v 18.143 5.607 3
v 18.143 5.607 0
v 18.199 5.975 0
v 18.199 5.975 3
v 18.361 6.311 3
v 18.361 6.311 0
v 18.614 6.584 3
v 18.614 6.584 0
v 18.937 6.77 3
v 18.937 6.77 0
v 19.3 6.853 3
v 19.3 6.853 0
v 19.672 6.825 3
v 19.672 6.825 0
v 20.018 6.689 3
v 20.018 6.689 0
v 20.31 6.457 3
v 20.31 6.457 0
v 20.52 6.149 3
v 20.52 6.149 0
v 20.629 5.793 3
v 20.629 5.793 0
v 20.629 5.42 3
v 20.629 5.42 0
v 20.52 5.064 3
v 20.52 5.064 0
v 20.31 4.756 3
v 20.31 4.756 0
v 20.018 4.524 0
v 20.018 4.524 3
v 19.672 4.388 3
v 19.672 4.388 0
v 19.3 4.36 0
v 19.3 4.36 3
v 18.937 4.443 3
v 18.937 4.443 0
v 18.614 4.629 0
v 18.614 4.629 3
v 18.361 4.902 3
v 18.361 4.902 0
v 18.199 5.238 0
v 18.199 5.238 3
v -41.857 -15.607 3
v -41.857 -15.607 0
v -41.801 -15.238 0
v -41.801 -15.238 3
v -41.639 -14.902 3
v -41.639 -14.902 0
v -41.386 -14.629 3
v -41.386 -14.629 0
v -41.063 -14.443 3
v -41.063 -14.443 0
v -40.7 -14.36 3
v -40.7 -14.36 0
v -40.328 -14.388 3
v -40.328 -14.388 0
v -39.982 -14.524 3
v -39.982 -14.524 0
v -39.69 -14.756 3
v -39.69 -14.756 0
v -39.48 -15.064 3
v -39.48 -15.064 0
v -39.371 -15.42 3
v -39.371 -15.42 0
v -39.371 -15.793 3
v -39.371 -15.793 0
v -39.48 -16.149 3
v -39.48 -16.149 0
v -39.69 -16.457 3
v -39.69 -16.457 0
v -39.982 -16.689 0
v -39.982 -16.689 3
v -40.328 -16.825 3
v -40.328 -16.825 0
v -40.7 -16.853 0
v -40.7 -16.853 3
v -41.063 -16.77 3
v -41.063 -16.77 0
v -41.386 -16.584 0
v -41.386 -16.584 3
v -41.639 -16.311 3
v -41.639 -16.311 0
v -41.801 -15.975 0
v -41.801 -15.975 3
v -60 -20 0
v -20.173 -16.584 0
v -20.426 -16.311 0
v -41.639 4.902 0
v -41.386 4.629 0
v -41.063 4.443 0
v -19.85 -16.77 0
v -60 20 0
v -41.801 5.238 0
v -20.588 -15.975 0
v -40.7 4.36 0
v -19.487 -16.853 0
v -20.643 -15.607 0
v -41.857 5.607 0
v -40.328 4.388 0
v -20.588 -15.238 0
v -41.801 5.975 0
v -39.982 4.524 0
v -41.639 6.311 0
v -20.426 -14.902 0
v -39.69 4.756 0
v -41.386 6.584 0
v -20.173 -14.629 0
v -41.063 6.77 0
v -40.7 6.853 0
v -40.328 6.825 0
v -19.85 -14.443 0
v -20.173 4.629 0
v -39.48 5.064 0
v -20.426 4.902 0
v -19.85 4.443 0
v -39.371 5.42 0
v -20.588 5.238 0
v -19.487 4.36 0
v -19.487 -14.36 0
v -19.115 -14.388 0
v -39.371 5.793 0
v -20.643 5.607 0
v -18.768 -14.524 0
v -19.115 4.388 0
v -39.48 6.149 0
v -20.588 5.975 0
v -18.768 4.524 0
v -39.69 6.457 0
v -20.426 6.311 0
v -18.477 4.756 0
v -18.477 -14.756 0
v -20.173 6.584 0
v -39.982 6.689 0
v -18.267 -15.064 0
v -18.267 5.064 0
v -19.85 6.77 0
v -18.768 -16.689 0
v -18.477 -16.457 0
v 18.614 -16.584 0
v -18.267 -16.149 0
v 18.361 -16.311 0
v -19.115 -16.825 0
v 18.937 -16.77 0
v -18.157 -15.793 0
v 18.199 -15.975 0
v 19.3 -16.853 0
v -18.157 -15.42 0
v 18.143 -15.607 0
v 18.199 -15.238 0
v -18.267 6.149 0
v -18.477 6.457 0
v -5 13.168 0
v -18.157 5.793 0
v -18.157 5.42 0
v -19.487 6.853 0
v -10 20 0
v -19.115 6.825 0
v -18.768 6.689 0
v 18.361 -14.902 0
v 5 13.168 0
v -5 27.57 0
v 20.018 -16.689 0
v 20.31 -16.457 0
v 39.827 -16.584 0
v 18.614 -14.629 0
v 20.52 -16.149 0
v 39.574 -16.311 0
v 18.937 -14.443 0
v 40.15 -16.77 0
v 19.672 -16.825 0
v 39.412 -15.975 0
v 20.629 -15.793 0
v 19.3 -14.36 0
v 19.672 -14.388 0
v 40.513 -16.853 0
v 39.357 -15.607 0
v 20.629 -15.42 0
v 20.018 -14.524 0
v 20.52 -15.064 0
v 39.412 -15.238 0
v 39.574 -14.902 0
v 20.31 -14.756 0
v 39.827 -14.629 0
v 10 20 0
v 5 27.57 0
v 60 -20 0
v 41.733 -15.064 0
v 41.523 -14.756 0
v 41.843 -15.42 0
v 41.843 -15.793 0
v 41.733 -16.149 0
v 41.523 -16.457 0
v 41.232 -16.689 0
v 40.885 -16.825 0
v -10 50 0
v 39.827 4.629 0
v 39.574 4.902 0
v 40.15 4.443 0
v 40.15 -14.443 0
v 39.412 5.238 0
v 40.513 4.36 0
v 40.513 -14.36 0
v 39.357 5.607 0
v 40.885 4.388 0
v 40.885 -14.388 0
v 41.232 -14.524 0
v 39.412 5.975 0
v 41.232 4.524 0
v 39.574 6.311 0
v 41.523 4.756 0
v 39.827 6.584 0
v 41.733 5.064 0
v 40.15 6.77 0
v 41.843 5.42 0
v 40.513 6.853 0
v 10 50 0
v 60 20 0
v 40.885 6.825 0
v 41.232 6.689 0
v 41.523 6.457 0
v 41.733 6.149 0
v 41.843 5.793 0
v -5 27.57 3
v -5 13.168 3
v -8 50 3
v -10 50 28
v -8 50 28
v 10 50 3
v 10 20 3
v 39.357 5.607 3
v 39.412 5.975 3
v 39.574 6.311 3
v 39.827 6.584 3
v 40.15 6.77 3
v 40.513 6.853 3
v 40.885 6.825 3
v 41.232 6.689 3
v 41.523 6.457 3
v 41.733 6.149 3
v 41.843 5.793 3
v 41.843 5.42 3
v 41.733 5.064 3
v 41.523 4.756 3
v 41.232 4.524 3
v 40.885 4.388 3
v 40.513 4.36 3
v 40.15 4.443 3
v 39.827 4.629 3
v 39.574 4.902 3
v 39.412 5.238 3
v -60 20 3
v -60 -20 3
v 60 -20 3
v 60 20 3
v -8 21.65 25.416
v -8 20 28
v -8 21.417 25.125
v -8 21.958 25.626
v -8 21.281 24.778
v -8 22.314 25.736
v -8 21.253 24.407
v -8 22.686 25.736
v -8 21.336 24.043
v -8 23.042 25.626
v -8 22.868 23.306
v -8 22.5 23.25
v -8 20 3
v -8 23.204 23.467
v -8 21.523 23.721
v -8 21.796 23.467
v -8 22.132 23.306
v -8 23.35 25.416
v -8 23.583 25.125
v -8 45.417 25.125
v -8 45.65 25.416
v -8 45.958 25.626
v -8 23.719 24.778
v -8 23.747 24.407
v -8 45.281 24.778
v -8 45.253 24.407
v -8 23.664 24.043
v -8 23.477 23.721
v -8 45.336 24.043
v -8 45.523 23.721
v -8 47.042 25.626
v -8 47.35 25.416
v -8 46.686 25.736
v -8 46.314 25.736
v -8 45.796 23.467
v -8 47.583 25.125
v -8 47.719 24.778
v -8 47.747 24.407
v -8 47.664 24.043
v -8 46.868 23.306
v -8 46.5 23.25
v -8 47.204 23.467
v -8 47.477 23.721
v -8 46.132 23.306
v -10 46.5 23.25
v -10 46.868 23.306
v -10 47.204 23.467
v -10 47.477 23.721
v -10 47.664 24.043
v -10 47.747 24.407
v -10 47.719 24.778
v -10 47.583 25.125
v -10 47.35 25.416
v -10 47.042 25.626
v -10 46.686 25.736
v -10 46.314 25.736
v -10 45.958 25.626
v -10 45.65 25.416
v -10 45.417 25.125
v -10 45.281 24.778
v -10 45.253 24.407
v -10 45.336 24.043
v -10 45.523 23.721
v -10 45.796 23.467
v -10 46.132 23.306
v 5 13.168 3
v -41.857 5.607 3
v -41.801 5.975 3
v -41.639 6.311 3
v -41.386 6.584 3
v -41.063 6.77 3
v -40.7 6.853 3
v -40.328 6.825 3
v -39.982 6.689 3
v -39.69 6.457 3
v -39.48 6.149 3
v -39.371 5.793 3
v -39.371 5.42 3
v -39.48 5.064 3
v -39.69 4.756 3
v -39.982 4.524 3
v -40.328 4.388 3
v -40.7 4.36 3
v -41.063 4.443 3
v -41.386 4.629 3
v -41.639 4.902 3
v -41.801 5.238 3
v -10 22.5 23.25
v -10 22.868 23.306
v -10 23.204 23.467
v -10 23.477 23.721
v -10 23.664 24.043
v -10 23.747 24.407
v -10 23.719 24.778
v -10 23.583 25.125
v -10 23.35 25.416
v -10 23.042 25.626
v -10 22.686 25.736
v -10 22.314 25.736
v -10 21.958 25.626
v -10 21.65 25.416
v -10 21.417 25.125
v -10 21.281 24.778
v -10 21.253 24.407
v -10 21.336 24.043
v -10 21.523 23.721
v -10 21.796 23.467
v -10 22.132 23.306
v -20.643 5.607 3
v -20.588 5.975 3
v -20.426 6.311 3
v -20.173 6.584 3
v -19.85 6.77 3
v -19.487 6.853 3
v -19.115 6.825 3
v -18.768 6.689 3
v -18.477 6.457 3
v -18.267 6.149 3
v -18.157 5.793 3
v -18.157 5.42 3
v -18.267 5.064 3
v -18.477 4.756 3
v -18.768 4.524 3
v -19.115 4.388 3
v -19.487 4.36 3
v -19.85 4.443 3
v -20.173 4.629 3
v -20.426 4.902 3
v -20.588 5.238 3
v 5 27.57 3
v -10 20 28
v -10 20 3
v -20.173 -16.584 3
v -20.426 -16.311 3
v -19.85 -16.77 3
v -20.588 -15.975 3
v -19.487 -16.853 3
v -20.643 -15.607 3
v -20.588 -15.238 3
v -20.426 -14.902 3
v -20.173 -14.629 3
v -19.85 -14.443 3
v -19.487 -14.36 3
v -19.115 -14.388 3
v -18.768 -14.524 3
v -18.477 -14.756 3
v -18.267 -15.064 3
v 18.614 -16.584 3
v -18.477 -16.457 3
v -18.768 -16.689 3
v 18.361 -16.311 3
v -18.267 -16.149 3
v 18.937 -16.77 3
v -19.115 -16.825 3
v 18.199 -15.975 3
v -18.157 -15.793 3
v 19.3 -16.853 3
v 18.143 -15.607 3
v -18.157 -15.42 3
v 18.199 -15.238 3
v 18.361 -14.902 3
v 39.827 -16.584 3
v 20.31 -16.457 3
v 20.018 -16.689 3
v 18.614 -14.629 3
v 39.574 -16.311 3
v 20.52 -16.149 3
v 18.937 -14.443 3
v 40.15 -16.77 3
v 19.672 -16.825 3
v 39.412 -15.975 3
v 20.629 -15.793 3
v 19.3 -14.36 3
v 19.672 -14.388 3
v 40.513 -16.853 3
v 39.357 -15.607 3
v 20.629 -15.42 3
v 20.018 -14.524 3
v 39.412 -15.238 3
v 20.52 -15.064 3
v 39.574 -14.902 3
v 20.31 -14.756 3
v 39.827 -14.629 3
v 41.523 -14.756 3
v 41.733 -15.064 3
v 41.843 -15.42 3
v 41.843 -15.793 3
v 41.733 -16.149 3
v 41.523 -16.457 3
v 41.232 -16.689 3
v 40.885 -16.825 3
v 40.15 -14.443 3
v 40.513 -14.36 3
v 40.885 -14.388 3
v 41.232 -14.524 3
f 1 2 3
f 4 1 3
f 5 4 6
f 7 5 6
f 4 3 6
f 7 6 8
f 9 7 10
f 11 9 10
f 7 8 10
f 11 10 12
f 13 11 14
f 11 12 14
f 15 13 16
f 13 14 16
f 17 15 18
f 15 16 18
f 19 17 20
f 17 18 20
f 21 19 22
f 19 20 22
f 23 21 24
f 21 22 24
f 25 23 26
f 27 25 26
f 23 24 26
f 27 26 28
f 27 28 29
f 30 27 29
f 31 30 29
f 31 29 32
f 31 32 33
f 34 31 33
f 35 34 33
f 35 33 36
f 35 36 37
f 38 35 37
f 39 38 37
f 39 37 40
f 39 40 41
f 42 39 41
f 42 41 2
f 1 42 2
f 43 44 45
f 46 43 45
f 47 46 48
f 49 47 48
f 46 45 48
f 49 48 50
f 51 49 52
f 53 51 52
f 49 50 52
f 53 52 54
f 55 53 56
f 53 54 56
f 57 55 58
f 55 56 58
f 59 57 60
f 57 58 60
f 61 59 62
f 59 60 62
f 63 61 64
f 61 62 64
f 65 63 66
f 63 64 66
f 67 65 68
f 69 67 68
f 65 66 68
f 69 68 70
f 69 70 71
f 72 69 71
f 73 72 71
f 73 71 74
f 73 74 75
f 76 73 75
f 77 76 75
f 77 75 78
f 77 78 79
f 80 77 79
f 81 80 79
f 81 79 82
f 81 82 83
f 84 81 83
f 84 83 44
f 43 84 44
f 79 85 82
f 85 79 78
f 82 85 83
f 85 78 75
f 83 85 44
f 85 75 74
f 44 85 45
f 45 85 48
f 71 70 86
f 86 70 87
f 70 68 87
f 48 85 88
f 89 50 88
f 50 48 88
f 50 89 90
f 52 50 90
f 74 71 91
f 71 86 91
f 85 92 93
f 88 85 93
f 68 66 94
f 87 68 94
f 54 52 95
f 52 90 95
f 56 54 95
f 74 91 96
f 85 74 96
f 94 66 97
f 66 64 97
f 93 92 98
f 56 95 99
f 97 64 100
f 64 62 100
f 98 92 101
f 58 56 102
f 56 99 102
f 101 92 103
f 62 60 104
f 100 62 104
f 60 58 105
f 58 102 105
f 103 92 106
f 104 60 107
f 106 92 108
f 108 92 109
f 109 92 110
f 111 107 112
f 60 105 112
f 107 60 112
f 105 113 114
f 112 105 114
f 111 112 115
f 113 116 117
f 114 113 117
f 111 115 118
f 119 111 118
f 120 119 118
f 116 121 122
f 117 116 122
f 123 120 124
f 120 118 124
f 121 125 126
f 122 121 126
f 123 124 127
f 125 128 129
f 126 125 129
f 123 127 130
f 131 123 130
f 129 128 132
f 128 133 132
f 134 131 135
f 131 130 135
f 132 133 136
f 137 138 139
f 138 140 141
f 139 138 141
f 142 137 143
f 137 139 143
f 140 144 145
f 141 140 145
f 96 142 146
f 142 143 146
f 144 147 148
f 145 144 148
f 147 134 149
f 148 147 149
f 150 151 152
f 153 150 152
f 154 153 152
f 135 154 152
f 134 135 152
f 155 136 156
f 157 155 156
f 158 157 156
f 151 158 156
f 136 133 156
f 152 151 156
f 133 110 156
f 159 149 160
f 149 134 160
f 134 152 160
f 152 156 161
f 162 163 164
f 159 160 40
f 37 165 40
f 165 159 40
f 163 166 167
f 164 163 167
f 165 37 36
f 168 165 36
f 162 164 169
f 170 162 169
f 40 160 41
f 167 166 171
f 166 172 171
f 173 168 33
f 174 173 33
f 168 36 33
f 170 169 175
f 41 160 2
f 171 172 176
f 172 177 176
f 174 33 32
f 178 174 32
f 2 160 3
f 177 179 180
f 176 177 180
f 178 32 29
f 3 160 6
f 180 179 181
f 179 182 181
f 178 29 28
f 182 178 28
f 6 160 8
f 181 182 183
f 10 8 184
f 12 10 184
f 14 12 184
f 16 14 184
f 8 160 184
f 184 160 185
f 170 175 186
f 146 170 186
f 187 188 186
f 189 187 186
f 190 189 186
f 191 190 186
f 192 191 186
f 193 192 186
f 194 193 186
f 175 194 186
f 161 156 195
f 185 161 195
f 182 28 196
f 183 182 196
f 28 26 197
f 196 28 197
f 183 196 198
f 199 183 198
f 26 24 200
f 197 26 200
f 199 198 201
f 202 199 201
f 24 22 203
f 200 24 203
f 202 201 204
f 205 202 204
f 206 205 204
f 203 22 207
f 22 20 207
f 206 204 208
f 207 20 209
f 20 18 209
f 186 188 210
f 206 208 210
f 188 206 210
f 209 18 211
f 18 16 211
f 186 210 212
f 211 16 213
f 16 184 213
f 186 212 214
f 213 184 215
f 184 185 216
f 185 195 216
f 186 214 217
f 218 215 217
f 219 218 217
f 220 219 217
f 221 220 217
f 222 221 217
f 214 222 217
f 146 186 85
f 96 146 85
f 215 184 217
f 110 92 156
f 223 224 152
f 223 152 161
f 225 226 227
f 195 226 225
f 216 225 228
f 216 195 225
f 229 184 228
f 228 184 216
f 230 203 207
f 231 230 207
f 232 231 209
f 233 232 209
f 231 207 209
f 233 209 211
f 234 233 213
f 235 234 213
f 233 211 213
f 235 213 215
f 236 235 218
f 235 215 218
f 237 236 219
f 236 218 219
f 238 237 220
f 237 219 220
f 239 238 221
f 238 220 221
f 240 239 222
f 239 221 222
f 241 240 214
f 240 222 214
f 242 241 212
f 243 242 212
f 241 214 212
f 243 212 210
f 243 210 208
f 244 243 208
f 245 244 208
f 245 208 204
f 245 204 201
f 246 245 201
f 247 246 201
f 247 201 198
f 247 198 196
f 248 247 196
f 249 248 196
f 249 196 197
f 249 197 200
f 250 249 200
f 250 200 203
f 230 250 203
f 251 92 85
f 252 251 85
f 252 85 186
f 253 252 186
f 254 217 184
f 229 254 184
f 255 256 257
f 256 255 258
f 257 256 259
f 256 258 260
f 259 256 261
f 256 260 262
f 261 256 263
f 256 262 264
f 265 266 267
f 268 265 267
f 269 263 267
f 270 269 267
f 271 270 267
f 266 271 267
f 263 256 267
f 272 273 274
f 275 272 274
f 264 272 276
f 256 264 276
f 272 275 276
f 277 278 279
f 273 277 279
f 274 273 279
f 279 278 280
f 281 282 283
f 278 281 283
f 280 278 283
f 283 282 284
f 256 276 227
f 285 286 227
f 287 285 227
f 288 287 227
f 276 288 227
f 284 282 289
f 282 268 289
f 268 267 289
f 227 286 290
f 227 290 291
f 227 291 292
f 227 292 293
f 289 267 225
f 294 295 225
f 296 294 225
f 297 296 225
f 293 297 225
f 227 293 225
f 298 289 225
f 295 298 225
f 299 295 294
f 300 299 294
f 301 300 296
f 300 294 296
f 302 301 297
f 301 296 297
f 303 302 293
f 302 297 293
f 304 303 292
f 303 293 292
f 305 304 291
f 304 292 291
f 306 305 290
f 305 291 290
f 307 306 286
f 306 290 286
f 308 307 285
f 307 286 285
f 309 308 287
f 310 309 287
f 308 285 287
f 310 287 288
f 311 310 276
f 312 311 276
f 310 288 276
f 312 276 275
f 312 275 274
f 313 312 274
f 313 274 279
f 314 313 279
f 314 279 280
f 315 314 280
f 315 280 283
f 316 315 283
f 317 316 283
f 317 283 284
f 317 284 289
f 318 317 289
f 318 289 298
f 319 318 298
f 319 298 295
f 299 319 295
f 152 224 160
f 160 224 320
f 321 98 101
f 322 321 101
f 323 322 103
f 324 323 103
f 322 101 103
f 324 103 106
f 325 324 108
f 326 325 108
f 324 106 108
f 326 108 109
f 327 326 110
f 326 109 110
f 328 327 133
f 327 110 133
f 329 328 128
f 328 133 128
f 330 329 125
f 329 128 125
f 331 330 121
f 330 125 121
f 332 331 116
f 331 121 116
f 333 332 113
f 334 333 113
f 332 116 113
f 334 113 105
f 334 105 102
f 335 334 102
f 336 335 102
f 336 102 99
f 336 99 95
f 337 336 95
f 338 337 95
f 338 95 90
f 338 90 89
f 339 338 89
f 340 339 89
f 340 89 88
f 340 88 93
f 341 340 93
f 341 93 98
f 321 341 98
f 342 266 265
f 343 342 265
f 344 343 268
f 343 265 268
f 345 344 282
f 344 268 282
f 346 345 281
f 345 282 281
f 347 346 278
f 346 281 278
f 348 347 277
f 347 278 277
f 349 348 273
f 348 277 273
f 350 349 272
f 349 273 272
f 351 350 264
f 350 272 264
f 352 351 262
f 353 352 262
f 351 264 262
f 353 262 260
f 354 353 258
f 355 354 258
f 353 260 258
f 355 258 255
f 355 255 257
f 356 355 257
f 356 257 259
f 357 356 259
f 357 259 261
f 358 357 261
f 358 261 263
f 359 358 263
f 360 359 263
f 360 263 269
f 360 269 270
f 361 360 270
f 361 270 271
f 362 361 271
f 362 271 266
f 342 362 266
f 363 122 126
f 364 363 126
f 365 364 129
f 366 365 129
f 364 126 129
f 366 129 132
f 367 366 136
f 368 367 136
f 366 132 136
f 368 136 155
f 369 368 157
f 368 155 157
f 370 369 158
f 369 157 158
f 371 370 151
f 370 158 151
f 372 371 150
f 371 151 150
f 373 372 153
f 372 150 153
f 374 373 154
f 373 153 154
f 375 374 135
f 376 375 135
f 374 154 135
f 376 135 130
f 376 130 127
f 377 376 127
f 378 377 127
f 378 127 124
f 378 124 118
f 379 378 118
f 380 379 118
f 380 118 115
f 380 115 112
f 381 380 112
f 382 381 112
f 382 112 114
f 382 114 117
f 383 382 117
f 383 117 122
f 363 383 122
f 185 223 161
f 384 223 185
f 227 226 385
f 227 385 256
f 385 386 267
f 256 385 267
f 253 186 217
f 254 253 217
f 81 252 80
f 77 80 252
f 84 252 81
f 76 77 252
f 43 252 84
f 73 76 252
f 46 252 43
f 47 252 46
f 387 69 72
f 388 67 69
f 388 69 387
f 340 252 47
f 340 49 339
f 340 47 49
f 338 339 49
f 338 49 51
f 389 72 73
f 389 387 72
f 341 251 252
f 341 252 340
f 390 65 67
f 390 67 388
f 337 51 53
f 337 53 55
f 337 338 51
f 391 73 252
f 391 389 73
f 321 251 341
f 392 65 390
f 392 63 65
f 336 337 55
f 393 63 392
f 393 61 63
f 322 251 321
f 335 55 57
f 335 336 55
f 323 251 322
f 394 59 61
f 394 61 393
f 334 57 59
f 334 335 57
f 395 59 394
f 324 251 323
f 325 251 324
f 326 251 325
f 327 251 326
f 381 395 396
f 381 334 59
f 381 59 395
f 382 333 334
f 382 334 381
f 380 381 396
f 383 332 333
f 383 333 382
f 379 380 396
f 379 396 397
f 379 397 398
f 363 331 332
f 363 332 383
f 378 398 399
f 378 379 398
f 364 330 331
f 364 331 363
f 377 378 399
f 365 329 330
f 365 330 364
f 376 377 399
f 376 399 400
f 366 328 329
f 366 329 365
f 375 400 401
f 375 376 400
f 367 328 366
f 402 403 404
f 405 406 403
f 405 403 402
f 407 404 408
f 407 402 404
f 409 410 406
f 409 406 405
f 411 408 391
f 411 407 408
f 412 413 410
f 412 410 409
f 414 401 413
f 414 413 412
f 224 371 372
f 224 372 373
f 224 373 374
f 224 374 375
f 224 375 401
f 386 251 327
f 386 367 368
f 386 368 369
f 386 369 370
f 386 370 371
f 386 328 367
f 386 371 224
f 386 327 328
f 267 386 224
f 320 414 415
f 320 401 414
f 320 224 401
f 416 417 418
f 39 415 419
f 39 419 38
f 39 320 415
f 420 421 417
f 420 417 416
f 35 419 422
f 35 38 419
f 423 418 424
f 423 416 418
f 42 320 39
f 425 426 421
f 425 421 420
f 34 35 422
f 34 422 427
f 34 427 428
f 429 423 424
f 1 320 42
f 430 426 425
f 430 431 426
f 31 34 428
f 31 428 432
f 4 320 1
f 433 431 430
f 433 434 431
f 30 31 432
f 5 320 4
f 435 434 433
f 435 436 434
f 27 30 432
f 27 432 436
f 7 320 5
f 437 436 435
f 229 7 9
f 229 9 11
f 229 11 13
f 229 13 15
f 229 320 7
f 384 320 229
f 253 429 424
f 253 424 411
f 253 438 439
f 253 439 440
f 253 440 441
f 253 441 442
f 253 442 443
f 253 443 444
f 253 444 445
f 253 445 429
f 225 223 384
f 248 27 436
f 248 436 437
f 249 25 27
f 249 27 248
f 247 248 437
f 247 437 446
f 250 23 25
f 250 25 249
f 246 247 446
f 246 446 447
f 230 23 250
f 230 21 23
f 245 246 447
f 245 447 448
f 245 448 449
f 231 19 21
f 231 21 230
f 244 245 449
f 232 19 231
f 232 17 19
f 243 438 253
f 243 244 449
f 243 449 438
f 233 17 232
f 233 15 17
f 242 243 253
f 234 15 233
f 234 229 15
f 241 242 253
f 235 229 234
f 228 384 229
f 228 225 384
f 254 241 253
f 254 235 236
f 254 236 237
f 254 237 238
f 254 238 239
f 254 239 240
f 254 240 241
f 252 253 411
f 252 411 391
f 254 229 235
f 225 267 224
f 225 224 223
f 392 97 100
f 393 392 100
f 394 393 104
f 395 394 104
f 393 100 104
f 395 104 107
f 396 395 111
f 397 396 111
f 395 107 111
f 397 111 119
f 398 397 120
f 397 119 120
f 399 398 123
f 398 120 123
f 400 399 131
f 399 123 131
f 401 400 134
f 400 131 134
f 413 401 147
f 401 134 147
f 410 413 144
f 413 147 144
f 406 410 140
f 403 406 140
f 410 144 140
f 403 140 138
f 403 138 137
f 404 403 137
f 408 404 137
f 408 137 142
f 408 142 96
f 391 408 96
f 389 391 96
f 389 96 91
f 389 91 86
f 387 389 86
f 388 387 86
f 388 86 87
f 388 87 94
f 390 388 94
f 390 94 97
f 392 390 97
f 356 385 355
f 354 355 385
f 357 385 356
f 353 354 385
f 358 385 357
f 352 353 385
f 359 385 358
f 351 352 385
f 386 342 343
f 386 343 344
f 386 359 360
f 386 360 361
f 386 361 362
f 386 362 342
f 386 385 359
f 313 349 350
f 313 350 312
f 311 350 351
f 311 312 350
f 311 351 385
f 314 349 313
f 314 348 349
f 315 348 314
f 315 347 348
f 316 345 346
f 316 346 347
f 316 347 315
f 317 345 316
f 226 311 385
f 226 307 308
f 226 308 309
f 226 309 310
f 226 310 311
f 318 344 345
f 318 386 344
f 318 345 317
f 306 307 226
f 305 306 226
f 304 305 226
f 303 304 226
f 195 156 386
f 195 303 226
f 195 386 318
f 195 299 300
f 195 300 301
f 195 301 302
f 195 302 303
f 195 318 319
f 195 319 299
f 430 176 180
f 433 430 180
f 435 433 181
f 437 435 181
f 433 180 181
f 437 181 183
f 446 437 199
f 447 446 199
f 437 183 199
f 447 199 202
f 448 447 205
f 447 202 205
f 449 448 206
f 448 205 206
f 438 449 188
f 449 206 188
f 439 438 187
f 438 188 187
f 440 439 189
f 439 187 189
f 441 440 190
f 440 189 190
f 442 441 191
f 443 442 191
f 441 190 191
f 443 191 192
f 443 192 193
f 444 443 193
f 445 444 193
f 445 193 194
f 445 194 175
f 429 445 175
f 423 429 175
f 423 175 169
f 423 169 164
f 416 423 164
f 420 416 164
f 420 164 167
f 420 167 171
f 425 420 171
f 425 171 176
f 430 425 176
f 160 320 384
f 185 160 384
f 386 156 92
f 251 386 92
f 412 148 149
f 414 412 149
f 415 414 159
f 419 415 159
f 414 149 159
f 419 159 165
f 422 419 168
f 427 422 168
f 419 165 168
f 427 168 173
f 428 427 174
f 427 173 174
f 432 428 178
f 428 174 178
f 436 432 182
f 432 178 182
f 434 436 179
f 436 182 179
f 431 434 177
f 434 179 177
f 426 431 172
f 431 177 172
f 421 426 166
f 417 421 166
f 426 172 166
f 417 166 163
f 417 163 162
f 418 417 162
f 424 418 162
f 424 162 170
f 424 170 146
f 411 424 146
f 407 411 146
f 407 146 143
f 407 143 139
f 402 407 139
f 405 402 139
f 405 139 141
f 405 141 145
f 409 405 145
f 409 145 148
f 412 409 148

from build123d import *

# Parameters (mm, degrees)
EXTRUDE_1_DEPTH     = 3
SKETCH_2_W          = 2
SKETCH_2_H          = 30
EXTRUDE_2_DEPTH     = 25
CUT_EXTRUDE_1_REACH = 84.006
SKETCH_5_W          = 10
SKETCH_5_H          = 14.402378288
HOLE_WIZARD_M3_2_D  = 2.5
HOLE_WIZARD_M3_3_D  = 2.5


with BuildPart() as part:
    # 草图1 → 凸台-拉伸1 (new body)
    with BuildSketch(Plane.XY):
        Polygon((-60, 20), (-60, -20), (60, -20), (60, 20), (10, 20), (10, 50), (-10, 50), (-10, 20), align=None)
    extrude(amount=EXTRUDE_1_DEPTH)

    # 草图2 → 凸台-拉伸2 (add)
    with BuildSketch(Plane.XY.offset(3)):
        with Locations((-9, 35)):
            Rectangle(SKETCH_2_W, SKETCH_2_H)
    extrude(amount=EXTRUDE_2_DEPTH)

    # 草图5 → 切除-拉伸1 (cut, up to next)
    with BuildSketch(Plane.XY.offset(3), mode=Mode.PRIVATE) as cut_extrude_1_sk1:
        with Locations((0, 20.369307695)):
            Rectangle(SKETCH_5_W, SKETCH_5_H)
    cut_extrude_1_tool1 = extrude(cut_extrude_1_sk1.sketch, amount=-CUT_EXTRUDE_1_REACH, mode=Mode.PRIVATE) & part.part
    add(cut_extrude_1_tool1.solids().sort_by_distance((0, 20.369308, 3))[0], mode=Mode.SUBTRACT)

    # M3 螺纹孔2 (through all)
    with Locations(Plane.ZY.offset(10)):
        with Locations((24.5, 46.5), (24.5, 22.5)):
            Hole(HOLE_WIZARD_M3_2_D / 2)

    # M3 螺纹孔3 (through all)
    with Locations(Plane.XY.offset(3)):
        with Locations((-40.606601718, 5.606601718), (-19.393398282, 5.606601718), (-19.393398282, -15.606601718), (-40.606601718, -15.606601718), (19.393398282, 5.606601718), (40.606601718, 5.606601718), (19.393398282, -15.606601718), (40.606601718, -15.606601718)):
            Hole(HOLE_WIZARD_M3_3_D / 2)


solid = part.part
